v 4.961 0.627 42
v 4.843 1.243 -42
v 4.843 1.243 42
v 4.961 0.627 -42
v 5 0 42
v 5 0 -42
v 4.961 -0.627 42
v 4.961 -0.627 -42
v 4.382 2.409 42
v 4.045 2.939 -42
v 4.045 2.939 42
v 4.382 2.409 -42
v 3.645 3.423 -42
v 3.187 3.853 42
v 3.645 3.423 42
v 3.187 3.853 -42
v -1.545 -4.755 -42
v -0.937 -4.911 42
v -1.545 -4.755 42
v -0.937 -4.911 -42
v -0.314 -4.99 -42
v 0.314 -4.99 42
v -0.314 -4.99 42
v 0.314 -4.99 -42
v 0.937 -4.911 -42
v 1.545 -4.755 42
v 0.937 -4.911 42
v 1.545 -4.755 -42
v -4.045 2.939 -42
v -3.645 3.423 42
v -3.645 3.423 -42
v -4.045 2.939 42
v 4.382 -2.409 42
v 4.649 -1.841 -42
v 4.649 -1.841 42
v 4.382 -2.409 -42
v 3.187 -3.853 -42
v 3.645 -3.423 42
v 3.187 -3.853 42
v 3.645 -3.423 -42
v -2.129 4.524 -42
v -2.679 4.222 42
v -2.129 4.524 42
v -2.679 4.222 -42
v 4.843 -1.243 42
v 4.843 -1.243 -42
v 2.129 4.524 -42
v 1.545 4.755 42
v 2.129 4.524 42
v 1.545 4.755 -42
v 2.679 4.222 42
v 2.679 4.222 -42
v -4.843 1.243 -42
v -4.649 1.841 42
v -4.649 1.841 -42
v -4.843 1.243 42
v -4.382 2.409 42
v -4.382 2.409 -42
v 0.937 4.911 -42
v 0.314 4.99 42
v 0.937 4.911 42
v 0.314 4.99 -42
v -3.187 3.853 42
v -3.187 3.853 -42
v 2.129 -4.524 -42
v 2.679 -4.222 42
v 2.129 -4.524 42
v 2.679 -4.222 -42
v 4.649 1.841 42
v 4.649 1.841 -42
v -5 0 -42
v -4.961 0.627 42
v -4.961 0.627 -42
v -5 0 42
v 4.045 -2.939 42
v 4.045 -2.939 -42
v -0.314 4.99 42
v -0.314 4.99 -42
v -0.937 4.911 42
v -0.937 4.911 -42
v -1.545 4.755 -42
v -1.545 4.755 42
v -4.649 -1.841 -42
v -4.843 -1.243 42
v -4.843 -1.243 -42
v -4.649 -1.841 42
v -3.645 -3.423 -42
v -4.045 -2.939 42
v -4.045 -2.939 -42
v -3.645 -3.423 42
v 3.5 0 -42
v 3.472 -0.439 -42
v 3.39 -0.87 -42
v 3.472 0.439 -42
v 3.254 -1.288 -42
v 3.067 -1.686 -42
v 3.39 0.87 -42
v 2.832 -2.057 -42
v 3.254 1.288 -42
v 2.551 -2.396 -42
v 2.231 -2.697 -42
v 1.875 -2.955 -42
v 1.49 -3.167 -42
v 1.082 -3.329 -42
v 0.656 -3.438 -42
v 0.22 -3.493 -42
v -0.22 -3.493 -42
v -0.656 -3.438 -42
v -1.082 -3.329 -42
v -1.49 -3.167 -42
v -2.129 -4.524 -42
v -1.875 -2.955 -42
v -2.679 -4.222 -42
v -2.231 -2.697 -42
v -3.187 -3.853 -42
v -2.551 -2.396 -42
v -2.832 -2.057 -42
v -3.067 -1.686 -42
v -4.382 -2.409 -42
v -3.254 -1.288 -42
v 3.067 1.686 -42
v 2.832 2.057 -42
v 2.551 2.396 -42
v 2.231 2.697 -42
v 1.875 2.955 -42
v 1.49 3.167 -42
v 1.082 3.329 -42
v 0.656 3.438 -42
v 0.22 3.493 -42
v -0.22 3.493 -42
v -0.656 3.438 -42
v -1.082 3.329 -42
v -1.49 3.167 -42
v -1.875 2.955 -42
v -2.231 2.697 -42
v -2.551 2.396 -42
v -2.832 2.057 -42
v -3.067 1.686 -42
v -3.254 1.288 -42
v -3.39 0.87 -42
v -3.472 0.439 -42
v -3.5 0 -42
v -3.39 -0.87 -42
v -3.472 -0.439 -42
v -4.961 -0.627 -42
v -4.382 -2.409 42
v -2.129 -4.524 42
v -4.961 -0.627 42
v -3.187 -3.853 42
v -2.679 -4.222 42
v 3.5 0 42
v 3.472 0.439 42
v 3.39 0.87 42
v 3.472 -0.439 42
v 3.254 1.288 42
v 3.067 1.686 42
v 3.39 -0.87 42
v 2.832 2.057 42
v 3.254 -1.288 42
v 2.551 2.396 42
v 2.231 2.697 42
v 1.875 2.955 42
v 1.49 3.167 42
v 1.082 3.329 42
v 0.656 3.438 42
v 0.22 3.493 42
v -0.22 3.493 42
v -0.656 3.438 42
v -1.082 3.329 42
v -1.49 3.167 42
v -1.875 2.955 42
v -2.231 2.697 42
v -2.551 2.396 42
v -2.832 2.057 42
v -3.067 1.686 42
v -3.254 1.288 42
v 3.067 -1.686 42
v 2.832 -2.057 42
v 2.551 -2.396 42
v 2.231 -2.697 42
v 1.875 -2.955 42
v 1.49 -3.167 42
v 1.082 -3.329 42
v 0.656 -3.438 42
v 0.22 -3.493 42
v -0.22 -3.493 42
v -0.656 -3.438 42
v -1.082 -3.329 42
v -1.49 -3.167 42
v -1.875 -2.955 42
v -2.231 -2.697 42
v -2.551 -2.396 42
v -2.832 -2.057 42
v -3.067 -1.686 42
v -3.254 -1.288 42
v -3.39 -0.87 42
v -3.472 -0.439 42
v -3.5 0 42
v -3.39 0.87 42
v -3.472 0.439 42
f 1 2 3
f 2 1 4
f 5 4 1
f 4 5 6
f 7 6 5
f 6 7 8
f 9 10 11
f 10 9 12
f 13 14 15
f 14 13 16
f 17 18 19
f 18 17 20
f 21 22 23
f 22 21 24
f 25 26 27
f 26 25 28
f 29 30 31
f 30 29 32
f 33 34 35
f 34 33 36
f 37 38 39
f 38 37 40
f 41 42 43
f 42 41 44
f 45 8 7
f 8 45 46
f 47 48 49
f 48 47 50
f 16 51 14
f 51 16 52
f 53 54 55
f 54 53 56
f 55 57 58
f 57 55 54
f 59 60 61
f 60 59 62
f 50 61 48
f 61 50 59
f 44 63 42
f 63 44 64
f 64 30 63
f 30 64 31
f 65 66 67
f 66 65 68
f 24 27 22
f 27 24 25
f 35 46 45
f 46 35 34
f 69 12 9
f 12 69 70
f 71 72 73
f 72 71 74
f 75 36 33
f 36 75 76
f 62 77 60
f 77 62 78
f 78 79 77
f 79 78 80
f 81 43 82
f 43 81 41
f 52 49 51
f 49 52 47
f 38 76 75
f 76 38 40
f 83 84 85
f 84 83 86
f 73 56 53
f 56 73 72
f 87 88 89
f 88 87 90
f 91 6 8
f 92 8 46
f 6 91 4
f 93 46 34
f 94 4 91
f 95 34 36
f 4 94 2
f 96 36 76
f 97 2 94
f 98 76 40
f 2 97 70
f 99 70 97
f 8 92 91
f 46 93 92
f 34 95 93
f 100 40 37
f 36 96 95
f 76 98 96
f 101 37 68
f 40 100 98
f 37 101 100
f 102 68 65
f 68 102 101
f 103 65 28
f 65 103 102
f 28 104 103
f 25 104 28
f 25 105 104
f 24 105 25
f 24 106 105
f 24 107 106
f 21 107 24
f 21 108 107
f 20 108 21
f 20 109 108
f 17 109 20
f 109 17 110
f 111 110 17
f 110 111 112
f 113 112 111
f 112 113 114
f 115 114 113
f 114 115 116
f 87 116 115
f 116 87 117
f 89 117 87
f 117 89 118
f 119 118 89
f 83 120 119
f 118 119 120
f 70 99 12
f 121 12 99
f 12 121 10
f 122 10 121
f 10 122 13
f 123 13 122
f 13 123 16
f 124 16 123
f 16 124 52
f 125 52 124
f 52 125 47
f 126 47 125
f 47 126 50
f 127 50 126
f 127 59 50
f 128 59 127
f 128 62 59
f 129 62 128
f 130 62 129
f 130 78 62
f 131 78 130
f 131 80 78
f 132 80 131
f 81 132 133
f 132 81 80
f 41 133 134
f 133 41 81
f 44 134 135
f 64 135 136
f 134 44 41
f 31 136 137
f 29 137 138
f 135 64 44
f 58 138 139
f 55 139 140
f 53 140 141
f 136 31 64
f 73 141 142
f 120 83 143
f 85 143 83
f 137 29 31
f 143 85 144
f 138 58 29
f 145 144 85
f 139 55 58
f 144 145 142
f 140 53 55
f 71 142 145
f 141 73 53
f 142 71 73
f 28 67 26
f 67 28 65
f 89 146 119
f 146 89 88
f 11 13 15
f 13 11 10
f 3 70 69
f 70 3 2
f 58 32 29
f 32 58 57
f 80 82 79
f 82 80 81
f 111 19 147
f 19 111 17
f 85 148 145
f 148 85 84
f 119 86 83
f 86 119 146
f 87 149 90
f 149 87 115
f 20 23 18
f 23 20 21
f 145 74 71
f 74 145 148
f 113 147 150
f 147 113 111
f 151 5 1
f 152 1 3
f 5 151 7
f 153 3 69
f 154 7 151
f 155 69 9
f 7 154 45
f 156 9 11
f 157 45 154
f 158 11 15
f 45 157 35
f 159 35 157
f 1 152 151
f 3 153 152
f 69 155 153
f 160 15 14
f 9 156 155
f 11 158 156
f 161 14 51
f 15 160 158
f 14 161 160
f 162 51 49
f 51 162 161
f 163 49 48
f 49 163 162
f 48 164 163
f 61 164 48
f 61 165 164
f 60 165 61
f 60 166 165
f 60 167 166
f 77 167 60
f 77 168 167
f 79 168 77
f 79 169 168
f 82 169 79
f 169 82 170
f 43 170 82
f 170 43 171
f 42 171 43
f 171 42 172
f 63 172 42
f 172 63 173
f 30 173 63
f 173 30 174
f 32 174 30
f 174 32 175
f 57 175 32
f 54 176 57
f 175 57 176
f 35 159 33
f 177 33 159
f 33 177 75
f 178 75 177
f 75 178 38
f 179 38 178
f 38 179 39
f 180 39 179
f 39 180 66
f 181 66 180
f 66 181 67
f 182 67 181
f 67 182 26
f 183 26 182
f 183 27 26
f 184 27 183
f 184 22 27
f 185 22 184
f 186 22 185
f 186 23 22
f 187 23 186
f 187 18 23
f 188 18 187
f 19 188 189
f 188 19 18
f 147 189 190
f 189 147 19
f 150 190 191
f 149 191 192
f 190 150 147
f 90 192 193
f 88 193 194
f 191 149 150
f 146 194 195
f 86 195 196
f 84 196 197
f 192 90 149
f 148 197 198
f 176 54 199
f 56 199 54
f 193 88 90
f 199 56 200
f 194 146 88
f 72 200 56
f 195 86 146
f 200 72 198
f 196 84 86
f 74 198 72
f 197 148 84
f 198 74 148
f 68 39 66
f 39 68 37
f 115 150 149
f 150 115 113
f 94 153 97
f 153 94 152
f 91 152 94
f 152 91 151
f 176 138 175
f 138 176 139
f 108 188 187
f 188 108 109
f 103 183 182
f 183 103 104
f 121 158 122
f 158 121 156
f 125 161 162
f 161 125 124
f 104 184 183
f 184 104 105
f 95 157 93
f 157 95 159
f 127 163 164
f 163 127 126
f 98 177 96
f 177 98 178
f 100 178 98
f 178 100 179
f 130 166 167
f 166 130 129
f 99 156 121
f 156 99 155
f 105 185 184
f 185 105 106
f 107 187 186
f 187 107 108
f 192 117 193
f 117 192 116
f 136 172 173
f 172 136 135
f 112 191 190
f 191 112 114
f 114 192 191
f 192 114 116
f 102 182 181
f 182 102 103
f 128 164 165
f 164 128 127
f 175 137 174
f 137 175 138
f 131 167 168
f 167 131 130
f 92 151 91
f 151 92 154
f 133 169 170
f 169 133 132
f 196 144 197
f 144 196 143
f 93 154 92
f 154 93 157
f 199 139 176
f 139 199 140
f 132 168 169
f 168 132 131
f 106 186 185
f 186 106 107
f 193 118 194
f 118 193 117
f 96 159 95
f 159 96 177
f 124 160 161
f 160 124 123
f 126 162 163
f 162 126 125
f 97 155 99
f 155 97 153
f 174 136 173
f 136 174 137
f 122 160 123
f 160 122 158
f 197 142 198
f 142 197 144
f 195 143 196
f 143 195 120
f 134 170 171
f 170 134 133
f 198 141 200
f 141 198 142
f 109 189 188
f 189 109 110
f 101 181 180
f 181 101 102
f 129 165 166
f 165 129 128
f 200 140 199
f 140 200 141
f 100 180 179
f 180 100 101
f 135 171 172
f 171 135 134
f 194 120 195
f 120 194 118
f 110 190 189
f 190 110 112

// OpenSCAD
$fn = 50;


difference() {
	union() {
		translate(v = [0, 0, -42.0000000000]) {
			cylinder(h = 84, r = 5.0000000000);
		}
	}
	union() {
		translate(v = [0, 0, -100.0000000000]) {
			cylinder(h = 200, r = 3.5000000000);
		}
	}
}
